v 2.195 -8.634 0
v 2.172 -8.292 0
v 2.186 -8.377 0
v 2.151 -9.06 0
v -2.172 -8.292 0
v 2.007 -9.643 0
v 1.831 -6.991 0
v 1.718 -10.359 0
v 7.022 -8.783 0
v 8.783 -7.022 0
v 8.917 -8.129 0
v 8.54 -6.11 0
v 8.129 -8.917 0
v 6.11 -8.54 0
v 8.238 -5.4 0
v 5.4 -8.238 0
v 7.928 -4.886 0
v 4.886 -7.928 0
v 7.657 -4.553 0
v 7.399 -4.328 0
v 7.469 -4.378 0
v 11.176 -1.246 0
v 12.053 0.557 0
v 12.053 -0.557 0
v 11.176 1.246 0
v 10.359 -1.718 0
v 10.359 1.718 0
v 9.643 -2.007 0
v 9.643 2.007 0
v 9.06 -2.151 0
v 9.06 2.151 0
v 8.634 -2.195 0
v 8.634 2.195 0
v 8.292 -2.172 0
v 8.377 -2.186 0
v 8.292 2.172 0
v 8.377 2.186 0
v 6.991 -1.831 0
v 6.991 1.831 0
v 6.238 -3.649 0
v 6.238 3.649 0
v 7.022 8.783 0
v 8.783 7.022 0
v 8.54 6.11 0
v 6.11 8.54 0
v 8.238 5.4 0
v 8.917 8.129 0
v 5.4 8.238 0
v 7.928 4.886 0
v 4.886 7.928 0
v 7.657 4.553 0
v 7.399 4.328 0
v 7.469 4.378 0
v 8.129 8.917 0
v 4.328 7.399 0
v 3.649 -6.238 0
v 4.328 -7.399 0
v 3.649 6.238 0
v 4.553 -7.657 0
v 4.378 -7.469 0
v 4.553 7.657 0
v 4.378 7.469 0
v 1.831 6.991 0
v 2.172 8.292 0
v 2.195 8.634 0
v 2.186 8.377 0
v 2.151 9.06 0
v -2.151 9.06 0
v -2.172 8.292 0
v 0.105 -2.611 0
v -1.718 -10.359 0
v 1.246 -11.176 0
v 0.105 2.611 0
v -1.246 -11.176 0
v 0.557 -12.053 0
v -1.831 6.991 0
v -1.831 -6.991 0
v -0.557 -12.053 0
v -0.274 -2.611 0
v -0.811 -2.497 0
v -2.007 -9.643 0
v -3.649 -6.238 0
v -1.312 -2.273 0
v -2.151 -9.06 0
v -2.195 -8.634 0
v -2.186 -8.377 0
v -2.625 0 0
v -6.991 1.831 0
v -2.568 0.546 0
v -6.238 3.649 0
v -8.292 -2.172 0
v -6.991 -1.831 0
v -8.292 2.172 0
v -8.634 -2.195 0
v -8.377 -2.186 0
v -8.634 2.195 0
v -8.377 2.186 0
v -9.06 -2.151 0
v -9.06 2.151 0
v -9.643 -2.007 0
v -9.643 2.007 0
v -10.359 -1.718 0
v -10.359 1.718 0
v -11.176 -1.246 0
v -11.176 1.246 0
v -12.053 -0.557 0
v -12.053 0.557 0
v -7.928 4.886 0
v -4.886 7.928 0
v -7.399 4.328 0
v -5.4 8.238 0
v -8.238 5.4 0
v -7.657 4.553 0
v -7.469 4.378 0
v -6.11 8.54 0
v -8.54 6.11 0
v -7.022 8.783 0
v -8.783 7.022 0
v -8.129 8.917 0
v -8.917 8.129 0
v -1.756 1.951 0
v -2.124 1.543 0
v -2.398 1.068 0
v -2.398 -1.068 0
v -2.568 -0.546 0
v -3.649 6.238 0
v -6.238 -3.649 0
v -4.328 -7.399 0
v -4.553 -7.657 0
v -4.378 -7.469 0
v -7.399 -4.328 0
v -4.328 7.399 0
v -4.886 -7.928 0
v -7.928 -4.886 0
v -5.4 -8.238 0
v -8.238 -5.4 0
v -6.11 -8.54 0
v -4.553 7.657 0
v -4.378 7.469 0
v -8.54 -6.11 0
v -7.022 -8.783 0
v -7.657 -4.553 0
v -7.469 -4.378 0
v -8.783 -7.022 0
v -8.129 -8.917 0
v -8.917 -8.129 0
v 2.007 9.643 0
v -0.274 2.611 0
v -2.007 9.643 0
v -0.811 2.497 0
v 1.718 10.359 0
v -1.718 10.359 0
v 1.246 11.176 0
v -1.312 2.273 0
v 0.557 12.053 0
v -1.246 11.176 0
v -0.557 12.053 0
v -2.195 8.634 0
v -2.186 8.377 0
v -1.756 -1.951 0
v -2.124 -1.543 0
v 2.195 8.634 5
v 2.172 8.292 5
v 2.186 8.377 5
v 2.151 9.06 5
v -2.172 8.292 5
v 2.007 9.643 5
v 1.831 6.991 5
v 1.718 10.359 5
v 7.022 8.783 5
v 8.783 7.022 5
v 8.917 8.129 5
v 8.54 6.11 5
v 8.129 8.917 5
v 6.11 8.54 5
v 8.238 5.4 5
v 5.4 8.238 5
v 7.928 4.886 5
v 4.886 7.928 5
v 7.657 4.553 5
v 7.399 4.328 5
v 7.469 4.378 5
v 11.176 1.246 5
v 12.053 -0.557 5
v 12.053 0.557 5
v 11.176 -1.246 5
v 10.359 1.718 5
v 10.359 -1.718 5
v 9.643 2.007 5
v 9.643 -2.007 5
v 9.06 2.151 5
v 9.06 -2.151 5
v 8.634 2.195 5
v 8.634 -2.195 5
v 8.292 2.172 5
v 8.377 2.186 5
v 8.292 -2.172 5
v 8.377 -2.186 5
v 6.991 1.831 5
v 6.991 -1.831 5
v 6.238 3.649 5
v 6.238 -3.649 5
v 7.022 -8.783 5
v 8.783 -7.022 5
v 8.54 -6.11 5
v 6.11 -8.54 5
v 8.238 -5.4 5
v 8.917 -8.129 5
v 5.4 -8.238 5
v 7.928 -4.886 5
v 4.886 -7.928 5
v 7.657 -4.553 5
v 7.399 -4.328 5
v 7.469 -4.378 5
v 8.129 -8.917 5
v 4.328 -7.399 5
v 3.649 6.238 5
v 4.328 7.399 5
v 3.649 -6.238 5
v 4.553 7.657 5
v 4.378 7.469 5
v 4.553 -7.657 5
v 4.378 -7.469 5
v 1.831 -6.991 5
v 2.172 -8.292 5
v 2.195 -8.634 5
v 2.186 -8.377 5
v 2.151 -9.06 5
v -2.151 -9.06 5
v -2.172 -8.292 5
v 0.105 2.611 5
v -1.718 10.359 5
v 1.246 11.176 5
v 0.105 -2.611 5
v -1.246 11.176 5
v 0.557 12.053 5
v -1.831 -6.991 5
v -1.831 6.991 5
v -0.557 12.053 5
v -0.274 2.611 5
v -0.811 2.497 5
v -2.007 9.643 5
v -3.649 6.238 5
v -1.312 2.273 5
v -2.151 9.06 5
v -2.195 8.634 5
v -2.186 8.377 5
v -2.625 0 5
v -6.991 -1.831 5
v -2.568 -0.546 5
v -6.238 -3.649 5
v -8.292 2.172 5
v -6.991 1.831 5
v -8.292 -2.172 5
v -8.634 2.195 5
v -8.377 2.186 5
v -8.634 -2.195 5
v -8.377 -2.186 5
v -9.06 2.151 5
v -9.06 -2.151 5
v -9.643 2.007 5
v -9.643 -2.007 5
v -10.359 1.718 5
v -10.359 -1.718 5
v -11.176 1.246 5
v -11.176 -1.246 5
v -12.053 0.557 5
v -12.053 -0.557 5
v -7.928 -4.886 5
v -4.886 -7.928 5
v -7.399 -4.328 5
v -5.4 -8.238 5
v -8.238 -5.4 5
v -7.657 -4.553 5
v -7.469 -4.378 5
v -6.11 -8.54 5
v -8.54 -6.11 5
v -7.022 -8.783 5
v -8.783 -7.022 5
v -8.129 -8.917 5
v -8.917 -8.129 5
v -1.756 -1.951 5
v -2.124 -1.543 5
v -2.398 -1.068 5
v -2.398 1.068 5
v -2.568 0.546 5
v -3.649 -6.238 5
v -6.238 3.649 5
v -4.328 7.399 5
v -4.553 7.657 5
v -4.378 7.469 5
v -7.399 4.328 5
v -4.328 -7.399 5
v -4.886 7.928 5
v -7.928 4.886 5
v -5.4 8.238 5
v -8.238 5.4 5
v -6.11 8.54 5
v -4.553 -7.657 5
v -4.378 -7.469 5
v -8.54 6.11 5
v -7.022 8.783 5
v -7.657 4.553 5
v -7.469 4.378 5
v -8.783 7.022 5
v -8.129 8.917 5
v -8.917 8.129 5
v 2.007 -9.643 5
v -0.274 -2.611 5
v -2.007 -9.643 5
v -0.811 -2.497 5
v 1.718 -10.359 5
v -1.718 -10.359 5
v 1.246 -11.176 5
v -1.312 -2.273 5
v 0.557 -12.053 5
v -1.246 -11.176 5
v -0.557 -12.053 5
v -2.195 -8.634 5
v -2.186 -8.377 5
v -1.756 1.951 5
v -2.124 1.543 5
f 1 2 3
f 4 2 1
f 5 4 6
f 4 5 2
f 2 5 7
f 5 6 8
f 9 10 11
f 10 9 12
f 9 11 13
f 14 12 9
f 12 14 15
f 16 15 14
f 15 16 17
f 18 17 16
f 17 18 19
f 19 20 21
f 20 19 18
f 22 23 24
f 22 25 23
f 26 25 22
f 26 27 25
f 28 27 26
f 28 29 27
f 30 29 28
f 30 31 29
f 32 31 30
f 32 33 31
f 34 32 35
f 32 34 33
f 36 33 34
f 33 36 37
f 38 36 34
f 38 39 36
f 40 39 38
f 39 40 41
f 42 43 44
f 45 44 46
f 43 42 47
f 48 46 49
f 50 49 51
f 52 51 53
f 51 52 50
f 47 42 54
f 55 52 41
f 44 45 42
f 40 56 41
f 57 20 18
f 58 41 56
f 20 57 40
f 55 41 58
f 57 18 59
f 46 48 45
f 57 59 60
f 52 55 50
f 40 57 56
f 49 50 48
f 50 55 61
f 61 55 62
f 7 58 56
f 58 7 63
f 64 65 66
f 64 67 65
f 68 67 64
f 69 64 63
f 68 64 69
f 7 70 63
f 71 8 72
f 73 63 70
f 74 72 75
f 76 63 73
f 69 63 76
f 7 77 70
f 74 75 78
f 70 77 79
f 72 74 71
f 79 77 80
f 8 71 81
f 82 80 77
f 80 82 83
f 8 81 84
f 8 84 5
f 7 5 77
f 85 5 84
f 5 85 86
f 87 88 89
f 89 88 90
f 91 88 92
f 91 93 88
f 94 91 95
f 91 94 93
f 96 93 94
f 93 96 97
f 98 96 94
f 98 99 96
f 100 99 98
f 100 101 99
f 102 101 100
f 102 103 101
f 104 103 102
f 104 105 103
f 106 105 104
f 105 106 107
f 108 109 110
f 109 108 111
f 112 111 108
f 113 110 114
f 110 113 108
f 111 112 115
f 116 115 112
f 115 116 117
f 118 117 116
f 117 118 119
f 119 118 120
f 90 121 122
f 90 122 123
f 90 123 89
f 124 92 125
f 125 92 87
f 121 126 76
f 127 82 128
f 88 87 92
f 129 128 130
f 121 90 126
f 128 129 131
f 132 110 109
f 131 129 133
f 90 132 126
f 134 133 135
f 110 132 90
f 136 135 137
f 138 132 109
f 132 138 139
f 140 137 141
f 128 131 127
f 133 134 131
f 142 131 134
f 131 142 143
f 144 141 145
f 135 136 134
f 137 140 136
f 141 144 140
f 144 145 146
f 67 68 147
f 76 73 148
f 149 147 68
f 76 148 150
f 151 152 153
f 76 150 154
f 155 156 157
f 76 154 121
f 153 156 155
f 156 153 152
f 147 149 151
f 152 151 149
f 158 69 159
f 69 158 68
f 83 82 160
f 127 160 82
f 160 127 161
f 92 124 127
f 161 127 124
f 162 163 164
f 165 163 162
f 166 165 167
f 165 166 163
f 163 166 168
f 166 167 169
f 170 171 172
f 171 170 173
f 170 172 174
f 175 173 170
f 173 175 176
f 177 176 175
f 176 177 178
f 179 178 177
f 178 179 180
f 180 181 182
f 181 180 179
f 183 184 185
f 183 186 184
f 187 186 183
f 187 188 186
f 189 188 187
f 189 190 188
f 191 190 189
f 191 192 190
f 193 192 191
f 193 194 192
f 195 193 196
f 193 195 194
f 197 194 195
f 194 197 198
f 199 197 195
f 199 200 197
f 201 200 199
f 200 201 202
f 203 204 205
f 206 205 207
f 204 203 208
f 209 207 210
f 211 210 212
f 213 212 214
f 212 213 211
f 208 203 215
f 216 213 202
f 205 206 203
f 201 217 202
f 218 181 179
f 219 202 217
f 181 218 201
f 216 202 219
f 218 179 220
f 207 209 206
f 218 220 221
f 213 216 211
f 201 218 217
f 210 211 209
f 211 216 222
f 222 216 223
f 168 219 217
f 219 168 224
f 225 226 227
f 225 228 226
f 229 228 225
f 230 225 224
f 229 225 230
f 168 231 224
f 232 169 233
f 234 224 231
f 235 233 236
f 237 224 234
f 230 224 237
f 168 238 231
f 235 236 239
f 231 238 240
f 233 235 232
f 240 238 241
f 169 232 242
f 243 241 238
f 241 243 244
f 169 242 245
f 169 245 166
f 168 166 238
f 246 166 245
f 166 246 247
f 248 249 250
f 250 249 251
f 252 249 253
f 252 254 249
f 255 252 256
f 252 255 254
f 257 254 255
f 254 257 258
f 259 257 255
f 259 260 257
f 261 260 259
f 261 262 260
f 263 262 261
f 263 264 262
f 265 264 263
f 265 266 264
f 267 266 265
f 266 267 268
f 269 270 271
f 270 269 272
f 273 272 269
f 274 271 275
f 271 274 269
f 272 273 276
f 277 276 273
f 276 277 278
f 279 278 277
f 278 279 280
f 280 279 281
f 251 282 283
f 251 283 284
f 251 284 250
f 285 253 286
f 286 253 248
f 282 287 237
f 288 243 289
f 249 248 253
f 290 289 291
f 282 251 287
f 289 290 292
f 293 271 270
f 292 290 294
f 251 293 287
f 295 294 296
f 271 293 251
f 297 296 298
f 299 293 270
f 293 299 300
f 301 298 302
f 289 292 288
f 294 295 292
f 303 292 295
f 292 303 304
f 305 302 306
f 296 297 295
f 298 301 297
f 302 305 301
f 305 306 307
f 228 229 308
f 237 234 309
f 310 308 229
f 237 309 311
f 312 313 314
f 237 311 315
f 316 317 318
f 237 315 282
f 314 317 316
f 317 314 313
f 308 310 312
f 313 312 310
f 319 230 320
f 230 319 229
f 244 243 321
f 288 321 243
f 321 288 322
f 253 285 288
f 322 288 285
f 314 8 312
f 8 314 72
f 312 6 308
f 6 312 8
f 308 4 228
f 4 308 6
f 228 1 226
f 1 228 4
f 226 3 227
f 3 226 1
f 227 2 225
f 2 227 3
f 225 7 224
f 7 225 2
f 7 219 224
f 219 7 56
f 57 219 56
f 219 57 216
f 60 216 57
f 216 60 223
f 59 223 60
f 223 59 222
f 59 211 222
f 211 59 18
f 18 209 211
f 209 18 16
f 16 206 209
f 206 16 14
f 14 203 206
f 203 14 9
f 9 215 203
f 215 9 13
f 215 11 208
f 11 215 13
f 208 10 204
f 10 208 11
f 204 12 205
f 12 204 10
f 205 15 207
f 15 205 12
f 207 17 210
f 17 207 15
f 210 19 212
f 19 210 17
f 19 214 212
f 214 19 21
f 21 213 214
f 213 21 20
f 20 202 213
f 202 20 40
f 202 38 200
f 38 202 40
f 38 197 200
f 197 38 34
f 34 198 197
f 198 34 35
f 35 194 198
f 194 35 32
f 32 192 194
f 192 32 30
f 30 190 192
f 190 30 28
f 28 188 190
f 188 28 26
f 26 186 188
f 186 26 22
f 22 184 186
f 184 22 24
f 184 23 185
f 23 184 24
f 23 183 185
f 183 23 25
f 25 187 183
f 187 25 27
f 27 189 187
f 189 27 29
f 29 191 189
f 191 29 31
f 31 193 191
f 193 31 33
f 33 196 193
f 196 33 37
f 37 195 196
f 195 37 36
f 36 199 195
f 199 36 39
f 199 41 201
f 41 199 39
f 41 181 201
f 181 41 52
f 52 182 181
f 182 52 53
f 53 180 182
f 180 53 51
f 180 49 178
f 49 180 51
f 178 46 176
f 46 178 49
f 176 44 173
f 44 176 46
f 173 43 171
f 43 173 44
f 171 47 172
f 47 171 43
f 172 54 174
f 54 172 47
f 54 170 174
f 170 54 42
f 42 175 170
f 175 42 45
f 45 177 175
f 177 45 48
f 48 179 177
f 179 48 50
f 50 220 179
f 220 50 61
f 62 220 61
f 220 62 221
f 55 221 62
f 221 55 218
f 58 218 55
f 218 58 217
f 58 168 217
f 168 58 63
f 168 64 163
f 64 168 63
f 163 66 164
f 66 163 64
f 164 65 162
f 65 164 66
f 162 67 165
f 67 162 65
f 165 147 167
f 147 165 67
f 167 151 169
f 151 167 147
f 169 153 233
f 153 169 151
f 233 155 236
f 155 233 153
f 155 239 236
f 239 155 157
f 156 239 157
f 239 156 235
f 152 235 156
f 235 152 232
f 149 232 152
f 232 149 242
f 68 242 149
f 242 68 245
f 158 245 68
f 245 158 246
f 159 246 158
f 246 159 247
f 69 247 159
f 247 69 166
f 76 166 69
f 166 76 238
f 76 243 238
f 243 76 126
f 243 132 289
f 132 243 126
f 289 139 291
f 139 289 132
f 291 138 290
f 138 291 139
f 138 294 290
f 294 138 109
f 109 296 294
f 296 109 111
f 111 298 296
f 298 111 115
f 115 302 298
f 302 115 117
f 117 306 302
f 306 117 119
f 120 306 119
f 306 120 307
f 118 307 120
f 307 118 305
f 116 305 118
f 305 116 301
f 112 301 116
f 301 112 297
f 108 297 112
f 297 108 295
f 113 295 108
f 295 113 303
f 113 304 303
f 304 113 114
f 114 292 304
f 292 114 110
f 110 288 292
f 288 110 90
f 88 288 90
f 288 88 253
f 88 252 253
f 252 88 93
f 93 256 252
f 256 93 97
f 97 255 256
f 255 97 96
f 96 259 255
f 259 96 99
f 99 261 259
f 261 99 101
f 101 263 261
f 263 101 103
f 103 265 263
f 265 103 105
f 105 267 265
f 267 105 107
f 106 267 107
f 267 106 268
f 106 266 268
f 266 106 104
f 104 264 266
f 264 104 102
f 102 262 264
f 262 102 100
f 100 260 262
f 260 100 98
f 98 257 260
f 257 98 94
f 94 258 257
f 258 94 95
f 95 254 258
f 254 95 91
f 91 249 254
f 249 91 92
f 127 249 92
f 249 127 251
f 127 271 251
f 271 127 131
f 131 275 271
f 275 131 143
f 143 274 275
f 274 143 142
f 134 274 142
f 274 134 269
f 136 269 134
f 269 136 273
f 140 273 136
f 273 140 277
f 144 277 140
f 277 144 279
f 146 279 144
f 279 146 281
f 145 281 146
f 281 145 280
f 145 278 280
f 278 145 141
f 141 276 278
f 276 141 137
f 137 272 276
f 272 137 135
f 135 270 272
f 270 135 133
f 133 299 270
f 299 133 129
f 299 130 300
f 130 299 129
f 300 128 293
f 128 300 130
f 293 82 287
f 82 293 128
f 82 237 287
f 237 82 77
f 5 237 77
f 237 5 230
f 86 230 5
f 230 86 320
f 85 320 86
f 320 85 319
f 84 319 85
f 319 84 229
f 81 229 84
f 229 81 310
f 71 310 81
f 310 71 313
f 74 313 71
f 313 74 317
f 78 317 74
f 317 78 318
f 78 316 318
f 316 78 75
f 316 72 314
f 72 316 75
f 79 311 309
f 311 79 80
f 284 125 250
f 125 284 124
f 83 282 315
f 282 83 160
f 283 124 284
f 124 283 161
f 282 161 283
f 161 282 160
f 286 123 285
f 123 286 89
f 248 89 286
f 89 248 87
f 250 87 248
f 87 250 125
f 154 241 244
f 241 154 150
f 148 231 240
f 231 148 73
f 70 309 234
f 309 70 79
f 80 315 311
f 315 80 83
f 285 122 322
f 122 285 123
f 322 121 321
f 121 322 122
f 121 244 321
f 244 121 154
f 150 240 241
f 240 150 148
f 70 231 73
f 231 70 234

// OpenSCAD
include <MCAD/involute_gears.scad>
$fn = 30;

prong_dia = 5.25; //form fit hot!!!!
prong_depth = 3;
rim_thickness = 5;
hole_wall_thickness = 1.5;
washer_thickness = 3;

gear (number_of_teeth=8,
					circular_pitch=450,
					hub_diameter=0,
					rim_width=6,
					rim_thickness=rim_thickness,
                    bore_diameter=prong_dia,
pressure_angle=31);

translate([.52*prong_dia,0,rim_thickness/2]){
cube([prong_dia,10,rim_thickness],center=true);
}

/*
//Washer
translate([0,0,rim_thickness])
cylinder(d=7, washer_thickness);
*/

/*
difference(){
translate([0,0, rim_thickness])
cylinder(d=prong_dia, 6 + washer_thickness);

translate([.5*prong_dia,0,rim_thickness+2+4/2+.01 + washer_thickness]){
cube([4,5,4],center=true);
}
}
*/
